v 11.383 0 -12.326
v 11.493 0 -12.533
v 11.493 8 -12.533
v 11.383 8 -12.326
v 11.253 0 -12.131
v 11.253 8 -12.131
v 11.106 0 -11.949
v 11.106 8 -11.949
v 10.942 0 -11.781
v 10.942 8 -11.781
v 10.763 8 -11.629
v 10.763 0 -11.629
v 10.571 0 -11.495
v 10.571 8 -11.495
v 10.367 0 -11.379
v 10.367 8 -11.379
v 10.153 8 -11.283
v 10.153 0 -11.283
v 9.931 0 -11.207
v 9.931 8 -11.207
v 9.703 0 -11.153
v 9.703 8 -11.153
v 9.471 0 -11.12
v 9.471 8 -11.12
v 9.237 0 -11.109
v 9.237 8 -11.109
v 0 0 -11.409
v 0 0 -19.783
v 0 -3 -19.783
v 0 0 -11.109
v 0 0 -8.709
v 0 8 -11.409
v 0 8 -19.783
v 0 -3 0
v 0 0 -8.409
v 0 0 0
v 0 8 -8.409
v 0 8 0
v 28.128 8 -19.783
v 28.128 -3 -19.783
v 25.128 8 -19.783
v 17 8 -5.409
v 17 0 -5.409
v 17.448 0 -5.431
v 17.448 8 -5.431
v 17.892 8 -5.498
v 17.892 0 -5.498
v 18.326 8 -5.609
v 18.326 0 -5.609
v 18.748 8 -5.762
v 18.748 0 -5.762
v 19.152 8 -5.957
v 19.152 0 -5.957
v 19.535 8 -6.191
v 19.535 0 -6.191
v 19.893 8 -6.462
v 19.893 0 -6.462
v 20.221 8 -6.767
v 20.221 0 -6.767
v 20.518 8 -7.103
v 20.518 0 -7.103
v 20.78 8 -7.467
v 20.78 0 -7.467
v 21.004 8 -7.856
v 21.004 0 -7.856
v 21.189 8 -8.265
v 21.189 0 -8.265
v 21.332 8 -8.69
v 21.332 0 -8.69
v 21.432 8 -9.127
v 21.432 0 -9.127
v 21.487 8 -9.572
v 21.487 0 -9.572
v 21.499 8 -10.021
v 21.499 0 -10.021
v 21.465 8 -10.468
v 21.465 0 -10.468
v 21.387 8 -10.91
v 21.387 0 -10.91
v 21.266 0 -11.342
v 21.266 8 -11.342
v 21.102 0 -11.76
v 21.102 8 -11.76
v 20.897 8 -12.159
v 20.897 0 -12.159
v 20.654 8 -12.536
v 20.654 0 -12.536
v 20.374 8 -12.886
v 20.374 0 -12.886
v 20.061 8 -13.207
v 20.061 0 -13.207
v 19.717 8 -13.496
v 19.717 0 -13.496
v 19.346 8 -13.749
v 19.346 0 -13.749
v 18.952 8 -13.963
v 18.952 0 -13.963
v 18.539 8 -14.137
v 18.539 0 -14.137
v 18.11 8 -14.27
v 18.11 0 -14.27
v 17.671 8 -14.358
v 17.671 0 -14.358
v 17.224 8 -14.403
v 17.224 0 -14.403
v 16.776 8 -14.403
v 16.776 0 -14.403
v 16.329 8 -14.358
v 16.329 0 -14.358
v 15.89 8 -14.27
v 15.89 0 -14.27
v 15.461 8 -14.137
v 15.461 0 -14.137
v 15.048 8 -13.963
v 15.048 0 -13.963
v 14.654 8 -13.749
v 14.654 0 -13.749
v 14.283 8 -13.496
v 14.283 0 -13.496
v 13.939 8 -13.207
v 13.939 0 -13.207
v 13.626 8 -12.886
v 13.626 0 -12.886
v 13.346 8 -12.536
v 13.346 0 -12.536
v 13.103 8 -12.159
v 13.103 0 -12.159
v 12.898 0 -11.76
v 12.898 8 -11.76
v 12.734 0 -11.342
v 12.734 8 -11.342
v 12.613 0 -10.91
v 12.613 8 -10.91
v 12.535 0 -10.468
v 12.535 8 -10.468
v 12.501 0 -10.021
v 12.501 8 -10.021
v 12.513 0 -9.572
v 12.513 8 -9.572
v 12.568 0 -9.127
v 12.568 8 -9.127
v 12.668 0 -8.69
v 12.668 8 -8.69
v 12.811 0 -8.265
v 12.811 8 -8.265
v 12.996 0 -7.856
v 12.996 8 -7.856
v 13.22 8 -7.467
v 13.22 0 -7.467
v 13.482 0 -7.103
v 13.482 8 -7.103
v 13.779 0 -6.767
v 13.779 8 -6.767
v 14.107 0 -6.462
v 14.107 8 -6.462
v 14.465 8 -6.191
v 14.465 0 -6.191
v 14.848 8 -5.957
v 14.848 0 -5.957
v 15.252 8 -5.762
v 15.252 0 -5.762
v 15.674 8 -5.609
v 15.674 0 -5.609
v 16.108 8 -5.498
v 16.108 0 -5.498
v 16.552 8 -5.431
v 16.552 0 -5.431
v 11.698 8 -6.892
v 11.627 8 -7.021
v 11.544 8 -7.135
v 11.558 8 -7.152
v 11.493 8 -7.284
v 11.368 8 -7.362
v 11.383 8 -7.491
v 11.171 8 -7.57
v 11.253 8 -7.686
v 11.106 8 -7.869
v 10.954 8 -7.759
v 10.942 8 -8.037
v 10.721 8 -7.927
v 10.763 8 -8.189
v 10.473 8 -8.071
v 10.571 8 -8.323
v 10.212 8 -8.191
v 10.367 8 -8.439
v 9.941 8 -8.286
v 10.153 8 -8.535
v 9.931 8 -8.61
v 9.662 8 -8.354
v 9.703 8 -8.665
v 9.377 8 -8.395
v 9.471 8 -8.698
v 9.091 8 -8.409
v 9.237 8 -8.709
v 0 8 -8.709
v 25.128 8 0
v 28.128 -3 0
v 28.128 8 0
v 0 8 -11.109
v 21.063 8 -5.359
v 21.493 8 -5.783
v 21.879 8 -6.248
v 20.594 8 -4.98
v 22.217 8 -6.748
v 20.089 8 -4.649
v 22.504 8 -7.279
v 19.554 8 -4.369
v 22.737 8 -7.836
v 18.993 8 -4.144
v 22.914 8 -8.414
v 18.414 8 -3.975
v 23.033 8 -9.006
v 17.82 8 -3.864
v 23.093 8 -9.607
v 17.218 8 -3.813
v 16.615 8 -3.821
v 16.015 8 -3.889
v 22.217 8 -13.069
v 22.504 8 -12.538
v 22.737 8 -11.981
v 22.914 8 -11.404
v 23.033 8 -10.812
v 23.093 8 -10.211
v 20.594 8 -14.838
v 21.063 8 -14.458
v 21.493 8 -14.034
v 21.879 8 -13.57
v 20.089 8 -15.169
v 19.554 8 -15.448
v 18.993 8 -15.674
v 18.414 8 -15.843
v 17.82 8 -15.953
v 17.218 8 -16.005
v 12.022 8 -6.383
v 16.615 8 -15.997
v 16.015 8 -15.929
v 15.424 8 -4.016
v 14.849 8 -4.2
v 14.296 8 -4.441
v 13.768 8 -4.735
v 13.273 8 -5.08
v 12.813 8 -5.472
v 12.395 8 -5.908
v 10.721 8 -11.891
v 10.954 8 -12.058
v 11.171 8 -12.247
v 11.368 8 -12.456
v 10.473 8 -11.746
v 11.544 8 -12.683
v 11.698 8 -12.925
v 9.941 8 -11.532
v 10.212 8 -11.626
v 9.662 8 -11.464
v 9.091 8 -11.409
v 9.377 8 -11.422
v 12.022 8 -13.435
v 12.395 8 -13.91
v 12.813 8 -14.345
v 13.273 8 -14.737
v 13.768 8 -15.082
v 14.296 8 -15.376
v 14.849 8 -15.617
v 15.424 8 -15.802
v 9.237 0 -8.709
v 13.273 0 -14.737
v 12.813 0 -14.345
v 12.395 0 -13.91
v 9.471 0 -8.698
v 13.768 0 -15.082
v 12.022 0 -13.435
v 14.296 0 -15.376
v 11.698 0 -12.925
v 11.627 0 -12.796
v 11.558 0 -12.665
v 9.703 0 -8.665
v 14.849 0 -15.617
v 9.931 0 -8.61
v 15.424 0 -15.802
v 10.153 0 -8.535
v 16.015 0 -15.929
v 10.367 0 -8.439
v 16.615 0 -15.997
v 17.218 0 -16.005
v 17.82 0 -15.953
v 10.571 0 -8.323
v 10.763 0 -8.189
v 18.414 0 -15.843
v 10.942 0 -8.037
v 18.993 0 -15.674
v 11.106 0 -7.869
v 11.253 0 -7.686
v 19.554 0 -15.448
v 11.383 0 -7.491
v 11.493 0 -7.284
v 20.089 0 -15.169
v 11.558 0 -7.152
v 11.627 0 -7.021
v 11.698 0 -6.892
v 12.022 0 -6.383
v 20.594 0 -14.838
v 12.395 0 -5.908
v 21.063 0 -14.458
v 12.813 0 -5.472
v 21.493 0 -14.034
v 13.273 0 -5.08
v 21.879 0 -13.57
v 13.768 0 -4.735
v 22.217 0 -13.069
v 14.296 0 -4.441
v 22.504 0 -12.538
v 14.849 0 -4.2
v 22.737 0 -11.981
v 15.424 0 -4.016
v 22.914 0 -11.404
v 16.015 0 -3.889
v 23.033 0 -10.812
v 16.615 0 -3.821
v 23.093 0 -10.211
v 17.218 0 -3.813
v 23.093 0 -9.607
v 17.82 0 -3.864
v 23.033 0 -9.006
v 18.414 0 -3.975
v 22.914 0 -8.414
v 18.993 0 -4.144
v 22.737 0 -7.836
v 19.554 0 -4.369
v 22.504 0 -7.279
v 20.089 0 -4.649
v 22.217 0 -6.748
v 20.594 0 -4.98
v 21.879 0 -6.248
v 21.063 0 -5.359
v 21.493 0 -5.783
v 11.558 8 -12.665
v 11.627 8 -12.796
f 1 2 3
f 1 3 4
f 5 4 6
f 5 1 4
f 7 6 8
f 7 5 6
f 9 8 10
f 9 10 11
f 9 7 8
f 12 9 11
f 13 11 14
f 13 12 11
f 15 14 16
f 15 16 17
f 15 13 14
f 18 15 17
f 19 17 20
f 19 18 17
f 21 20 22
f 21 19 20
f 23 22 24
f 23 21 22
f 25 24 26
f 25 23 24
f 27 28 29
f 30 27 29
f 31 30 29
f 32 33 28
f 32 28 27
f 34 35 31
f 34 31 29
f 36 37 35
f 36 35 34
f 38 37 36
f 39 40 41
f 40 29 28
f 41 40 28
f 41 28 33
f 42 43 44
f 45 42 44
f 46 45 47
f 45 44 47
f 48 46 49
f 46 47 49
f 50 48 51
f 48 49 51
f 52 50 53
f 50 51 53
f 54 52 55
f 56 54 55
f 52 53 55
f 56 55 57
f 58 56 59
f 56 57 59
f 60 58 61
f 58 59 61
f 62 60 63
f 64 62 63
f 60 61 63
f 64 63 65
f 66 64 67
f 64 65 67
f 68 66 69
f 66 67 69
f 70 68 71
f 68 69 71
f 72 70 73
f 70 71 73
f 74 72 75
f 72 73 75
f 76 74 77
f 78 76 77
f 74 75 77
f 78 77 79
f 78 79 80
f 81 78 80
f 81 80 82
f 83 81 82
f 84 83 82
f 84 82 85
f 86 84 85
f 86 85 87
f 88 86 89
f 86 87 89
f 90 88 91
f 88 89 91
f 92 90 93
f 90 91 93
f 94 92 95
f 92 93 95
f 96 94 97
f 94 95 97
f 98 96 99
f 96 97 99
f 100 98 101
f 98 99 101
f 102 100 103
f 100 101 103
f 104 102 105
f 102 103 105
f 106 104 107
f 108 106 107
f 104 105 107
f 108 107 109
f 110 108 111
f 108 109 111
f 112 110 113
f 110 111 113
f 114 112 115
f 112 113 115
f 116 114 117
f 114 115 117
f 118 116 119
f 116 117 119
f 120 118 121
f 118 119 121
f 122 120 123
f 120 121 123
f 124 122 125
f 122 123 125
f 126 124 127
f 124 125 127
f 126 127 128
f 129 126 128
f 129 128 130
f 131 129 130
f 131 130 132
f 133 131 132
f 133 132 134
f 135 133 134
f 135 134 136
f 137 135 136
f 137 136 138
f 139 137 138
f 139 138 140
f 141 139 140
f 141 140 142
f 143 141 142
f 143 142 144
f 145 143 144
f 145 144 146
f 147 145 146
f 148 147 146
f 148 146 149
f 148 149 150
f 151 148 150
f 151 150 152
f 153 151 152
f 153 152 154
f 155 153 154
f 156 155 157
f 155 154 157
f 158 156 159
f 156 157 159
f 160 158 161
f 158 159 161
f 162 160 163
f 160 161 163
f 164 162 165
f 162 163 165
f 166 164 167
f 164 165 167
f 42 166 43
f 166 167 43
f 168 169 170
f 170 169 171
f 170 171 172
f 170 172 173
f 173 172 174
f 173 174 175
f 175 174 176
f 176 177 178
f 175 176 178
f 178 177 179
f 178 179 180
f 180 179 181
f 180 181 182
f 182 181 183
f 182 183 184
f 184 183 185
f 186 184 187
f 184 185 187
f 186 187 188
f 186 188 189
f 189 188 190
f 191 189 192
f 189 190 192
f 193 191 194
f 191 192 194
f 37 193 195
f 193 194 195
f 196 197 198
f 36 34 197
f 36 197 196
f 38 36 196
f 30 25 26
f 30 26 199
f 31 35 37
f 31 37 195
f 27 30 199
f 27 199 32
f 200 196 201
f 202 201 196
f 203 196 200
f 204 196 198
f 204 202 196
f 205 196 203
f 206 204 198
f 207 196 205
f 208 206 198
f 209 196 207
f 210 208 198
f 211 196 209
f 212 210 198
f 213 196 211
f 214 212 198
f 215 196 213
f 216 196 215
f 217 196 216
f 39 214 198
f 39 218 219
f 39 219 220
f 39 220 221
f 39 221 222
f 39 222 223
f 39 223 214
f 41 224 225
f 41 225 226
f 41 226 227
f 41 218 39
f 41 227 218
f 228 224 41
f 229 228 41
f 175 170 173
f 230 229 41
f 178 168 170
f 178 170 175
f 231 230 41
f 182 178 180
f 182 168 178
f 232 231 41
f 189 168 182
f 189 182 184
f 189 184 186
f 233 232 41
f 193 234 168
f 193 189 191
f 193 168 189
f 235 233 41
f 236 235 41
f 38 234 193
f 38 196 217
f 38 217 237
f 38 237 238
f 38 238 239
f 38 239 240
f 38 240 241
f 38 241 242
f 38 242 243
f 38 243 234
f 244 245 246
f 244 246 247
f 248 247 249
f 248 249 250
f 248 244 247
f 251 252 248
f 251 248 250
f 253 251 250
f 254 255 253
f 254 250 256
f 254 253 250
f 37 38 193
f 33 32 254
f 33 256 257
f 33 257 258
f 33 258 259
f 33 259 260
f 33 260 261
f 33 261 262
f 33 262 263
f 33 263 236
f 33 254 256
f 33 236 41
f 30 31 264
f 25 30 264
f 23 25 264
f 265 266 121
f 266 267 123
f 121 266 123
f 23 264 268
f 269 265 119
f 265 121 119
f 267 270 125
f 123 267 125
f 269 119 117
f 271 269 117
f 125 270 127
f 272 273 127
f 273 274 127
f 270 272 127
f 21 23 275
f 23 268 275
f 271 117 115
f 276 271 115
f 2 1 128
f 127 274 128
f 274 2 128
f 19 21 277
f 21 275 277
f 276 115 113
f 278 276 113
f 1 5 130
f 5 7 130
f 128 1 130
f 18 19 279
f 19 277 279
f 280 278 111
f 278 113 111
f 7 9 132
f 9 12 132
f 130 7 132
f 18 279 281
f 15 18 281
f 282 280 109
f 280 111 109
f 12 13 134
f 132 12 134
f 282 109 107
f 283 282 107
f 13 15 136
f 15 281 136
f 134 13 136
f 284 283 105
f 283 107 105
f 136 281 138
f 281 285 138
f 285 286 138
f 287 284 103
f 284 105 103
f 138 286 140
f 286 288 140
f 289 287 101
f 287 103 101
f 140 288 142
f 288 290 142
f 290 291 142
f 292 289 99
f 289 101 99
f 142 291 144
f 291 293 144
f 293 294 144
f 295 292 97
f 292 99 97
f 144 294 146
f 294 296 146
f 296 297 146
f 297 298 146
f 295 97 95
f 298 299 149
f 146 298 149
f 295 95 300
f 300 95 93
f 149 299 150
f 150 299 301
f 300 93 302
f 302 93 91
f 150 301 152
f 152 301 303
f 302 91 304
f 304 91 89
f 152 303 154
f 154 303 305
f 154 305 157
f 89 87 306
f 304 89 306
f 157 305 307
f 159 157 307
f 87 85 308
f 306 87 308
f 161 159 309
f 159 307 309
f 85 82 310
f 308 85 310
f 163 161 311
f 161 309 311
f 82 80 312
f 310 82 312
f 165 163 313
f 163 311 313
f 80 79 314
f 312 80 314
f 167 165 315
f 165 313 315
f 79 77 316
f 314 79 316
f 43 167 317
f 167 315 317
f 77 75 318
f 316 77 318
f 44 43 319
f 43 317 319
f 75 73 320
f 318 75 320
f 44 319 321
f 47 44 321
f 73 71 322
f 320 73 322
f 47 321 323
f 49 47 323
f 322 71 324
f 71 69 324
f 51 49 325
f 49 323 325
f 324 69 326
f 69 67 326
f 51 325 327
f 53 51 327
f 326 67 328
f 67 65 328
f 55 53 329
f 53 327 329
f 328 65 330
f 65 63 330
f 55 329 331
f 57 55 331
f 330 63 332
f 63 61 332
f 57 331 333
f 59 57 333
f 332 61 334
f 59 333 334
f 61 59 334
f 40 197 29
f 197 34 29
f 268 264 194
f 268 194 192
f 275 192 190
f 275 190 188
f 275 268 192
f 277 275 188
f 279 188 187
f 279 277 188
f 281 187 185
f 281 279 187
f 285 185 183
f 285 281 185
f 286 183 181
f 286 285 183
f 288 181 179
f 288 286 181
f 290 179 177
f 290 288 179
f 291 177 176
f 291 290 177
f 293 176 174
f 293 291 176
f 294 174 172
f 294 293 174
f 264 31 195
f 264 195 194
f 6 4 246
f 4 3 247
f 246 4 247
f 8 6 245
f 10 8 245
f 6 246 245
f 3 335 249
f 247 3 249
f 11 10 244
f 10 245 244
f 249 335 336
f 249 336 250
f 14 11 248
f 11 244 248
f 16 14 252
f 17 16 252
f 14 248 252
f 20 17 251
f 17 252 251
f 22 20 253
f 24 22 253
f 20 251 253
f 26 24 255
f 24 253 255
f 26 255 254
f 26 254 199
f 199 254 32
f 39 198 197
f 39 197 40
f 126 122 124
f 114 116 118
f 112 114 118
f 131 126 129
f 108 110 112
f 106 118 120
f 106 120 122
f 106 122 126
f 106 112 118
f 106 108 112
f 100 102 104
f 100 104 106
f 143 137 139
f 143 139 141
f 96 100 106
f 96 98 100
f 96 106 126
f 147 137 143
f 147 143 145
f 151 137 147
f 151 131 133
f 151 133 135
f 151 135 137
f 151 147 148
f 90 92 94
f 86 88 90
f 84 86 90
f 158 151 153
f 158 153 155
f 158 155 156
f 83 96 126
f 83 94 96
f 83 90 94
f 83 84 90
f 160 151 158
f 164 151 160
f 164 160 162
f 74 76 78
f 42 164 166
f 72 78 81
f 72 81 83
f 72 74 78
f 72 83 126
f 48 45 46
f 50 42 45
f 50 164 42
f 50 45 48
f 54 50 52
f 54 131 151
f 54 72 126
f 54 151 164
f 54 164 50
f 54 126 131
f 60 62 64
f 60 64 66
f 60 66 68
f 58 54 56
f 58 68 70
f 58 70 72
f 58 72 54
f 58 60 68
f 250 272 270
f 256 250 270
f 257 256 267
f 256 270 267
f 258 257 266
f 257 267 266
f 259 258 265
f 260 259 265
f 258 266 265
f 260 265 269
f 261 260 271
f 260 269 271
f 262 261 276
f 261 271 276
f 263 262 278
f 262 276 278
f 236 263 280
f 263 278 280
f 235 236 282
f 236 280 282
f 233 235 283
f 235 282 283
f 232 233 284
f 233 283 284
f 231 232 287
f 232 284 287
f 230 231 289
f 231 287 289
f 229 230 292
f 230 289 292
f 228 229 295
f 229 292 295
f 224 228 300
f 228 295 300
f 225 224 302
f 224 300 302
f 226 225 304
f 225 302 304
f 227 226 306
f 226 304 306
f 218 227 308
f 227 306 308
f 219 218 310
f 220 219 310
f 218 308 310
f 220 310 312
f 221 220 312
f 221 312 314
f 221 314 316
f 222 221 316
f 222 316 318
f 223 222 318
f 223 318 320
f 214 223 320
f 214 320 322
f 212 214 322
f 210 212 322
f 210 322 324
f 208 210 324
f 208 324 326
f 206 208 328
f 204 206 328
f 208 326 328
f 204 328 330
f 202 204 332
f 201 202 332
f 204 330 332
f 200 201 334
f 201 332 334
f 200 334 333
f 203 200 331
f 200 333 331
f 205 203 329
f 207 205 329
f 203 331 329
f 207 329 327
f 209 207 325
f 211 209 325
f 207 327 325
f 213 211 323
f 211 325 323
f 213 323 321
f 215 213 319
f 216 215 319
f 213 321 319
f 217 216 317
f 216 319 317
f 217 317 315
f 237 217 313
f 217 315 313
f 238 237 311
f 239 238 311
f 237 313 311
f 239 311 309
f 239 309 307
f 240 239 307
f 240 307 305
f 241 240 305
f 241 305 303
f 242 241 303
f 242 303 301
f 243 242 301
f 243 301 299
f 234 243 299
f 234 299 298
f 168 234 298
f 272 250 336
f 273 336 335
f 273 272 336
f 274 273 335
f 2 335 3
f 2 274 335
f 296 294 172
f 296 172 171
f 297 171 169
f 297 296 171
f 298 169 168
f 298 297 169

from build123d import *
from build123d.topology import SkipClean

# Parameters (mm, degrees)
BOSS_EXTRUDE3_DEPTH   = 8
SKETCH2_R             = 4.5
BOSS_EXTRUDE3_2_DEPTH = 8
SKETCH4_W             = 25.128147065
SKETCH4_H             = 19.783027293
BOSS_EXTRUDE4_DEPTH   = 3
SKETCH5_W             = 19.783027293
SKETCH5_H             = 11
BOSS_EXTRUDE5_DEPTH   = 3
BOSS_EXTRUDE6_START   = -8
BOSS_EXTRUDE6_DEPTH   = 8


with BuildPart() as part:
    # Sketch2 → Boss-Extrude3 (new body)
    with BuildSketch(Plane(origin=(0, 0, 0), x_dir=(1, 0, 0), z_dir=(0, 1, 0))):
        with BuildLine():
            Line((0, 19.783027293), (0, 11.408726598))
            Line((0, 11.408726598), (9.090512027, 11.408726598))
            ThreePointArc((9.090512027, 11.408726598), (10.598731266, 11.815413134), (11.698035534, 12.925210115))
            ThreePointArc((11.698035534, 12.925210115), (23.1, 9.908726598), (11.698035534, 6.892243082))
            ThreePointArc((11.698035534, 6.892243082), (10.598731266, 8.002040063), (9.090512027, 8.408726598))
            Line((9.090512027, 8.408726598), (0, 8.408726598))
            Line((0, 8.408726598), (0, 0))
            Line((0, 0), (25.128147065, 0))
            Line((25.128147065, 0), (25.128147065, 19.783027293))
            Line((25.128147065, 19.783027293), (0, 19.783027293))
        make_face()
    extrude(amount=BOSS_EXTRUDE3_DEPTH)



with BuildPart() as body_2:
    # Sketch2 → Boss-Extrude3 2 (new body)
    with BuildSketch(Plane(origin=(0, 0, 0), x_dir=(1, 0, 0), z_dir=(0, 1, 0))):
        with Locations(Location((17, 9.908726598, 0), (0, 0, 270))):
            Circle(SKETCH2_R)
    extrude(amount=BOSS_EXTRUDE3_2_DEPTH)


with BuildPart() as part_1:
    add(part.part)

    add(body_2.part)  # Boss-Extrude4 merges body 2
    # Sketch4 → Boss-Extrude4 (add)
    with BuildSketch(Plane.XZ):
        with Locations((12.564073533, -9.891513646)):
            Rectangle(SKETCH4_W, SKETCH4_H)
    extrude(amount=BOSS_EXTRUDE4_DEPTH)

    # Sketch5 → Boss-Extrude5 (add)
    with BuildSketch(Plane(origin=(25.128147065, 0, 0), x_dir=(0, 0, -1), z_dir=(1, 0, 0))):
        with Locations((9.891513646, 2.5)):
            Rectangle(SKETCH5_W, SKETCH5_H)
    extrude(amount=BOSS_EXTRUDE5_DEPTH)

    # Sketch6 → Boss-Extrude6 (add)
    with SkipClean():  # the faces are left unmerged after this step: merging them gives an invalid solid
        with BuildSketch(Plane(origin=(0, 8, 0), x_dir=(1, 0, 0), z_dir=(0, 1, 0)).offset(BOSS_EXTRUDE6_START)):
            with BuildLine():
                ThreePointArc((11.493419665, 12.533145203), (10.570986936, 11.494612896), (9.236624446, 11.108726598))
                Line((9.236624446, 11.108726598), (0, 11.108726598))
                Line((0, 11.108726598), (0, 11.408726598))
                Line((0, 11.408726598), (9.090512027, 11.408726598))
                ThreePointArc((9.090512027, 11.408726598), (10.598731266, 11.815413134), (11.698035534, 12.925210115))
                ThreePointArc((11.698035534, 12.925210115), (11.592173366, 12.731032588), (11.493419665, 12.533145203))
            make_face()
            with BuildLine():
                ThreePointArc((11.493419665, 7.284307994), (11.592173366, 7.086420609), (11.698035534, 6.892243082))
                ThreePointArc((11.698035534, 6.892243082), (10.598731266, 8.002040063), (9.090512027, 8.408726598))
                Line((9.090512027, 8.408726598), (0, 8.408726598))
                Line((0, 8.408726598), (0, 8.708726598))
                Line((0, 8.708726598), (9.236624446, 8.708726598))
                ThreePointArc((9.236624446, 8.708726598), (10.570986936, 8.3228403), (11.493419665, 7.284307994))
            make_face()
        extrude(amount=BOSS_EXTRUDE6_DEPTH)


solid = part_1.part
